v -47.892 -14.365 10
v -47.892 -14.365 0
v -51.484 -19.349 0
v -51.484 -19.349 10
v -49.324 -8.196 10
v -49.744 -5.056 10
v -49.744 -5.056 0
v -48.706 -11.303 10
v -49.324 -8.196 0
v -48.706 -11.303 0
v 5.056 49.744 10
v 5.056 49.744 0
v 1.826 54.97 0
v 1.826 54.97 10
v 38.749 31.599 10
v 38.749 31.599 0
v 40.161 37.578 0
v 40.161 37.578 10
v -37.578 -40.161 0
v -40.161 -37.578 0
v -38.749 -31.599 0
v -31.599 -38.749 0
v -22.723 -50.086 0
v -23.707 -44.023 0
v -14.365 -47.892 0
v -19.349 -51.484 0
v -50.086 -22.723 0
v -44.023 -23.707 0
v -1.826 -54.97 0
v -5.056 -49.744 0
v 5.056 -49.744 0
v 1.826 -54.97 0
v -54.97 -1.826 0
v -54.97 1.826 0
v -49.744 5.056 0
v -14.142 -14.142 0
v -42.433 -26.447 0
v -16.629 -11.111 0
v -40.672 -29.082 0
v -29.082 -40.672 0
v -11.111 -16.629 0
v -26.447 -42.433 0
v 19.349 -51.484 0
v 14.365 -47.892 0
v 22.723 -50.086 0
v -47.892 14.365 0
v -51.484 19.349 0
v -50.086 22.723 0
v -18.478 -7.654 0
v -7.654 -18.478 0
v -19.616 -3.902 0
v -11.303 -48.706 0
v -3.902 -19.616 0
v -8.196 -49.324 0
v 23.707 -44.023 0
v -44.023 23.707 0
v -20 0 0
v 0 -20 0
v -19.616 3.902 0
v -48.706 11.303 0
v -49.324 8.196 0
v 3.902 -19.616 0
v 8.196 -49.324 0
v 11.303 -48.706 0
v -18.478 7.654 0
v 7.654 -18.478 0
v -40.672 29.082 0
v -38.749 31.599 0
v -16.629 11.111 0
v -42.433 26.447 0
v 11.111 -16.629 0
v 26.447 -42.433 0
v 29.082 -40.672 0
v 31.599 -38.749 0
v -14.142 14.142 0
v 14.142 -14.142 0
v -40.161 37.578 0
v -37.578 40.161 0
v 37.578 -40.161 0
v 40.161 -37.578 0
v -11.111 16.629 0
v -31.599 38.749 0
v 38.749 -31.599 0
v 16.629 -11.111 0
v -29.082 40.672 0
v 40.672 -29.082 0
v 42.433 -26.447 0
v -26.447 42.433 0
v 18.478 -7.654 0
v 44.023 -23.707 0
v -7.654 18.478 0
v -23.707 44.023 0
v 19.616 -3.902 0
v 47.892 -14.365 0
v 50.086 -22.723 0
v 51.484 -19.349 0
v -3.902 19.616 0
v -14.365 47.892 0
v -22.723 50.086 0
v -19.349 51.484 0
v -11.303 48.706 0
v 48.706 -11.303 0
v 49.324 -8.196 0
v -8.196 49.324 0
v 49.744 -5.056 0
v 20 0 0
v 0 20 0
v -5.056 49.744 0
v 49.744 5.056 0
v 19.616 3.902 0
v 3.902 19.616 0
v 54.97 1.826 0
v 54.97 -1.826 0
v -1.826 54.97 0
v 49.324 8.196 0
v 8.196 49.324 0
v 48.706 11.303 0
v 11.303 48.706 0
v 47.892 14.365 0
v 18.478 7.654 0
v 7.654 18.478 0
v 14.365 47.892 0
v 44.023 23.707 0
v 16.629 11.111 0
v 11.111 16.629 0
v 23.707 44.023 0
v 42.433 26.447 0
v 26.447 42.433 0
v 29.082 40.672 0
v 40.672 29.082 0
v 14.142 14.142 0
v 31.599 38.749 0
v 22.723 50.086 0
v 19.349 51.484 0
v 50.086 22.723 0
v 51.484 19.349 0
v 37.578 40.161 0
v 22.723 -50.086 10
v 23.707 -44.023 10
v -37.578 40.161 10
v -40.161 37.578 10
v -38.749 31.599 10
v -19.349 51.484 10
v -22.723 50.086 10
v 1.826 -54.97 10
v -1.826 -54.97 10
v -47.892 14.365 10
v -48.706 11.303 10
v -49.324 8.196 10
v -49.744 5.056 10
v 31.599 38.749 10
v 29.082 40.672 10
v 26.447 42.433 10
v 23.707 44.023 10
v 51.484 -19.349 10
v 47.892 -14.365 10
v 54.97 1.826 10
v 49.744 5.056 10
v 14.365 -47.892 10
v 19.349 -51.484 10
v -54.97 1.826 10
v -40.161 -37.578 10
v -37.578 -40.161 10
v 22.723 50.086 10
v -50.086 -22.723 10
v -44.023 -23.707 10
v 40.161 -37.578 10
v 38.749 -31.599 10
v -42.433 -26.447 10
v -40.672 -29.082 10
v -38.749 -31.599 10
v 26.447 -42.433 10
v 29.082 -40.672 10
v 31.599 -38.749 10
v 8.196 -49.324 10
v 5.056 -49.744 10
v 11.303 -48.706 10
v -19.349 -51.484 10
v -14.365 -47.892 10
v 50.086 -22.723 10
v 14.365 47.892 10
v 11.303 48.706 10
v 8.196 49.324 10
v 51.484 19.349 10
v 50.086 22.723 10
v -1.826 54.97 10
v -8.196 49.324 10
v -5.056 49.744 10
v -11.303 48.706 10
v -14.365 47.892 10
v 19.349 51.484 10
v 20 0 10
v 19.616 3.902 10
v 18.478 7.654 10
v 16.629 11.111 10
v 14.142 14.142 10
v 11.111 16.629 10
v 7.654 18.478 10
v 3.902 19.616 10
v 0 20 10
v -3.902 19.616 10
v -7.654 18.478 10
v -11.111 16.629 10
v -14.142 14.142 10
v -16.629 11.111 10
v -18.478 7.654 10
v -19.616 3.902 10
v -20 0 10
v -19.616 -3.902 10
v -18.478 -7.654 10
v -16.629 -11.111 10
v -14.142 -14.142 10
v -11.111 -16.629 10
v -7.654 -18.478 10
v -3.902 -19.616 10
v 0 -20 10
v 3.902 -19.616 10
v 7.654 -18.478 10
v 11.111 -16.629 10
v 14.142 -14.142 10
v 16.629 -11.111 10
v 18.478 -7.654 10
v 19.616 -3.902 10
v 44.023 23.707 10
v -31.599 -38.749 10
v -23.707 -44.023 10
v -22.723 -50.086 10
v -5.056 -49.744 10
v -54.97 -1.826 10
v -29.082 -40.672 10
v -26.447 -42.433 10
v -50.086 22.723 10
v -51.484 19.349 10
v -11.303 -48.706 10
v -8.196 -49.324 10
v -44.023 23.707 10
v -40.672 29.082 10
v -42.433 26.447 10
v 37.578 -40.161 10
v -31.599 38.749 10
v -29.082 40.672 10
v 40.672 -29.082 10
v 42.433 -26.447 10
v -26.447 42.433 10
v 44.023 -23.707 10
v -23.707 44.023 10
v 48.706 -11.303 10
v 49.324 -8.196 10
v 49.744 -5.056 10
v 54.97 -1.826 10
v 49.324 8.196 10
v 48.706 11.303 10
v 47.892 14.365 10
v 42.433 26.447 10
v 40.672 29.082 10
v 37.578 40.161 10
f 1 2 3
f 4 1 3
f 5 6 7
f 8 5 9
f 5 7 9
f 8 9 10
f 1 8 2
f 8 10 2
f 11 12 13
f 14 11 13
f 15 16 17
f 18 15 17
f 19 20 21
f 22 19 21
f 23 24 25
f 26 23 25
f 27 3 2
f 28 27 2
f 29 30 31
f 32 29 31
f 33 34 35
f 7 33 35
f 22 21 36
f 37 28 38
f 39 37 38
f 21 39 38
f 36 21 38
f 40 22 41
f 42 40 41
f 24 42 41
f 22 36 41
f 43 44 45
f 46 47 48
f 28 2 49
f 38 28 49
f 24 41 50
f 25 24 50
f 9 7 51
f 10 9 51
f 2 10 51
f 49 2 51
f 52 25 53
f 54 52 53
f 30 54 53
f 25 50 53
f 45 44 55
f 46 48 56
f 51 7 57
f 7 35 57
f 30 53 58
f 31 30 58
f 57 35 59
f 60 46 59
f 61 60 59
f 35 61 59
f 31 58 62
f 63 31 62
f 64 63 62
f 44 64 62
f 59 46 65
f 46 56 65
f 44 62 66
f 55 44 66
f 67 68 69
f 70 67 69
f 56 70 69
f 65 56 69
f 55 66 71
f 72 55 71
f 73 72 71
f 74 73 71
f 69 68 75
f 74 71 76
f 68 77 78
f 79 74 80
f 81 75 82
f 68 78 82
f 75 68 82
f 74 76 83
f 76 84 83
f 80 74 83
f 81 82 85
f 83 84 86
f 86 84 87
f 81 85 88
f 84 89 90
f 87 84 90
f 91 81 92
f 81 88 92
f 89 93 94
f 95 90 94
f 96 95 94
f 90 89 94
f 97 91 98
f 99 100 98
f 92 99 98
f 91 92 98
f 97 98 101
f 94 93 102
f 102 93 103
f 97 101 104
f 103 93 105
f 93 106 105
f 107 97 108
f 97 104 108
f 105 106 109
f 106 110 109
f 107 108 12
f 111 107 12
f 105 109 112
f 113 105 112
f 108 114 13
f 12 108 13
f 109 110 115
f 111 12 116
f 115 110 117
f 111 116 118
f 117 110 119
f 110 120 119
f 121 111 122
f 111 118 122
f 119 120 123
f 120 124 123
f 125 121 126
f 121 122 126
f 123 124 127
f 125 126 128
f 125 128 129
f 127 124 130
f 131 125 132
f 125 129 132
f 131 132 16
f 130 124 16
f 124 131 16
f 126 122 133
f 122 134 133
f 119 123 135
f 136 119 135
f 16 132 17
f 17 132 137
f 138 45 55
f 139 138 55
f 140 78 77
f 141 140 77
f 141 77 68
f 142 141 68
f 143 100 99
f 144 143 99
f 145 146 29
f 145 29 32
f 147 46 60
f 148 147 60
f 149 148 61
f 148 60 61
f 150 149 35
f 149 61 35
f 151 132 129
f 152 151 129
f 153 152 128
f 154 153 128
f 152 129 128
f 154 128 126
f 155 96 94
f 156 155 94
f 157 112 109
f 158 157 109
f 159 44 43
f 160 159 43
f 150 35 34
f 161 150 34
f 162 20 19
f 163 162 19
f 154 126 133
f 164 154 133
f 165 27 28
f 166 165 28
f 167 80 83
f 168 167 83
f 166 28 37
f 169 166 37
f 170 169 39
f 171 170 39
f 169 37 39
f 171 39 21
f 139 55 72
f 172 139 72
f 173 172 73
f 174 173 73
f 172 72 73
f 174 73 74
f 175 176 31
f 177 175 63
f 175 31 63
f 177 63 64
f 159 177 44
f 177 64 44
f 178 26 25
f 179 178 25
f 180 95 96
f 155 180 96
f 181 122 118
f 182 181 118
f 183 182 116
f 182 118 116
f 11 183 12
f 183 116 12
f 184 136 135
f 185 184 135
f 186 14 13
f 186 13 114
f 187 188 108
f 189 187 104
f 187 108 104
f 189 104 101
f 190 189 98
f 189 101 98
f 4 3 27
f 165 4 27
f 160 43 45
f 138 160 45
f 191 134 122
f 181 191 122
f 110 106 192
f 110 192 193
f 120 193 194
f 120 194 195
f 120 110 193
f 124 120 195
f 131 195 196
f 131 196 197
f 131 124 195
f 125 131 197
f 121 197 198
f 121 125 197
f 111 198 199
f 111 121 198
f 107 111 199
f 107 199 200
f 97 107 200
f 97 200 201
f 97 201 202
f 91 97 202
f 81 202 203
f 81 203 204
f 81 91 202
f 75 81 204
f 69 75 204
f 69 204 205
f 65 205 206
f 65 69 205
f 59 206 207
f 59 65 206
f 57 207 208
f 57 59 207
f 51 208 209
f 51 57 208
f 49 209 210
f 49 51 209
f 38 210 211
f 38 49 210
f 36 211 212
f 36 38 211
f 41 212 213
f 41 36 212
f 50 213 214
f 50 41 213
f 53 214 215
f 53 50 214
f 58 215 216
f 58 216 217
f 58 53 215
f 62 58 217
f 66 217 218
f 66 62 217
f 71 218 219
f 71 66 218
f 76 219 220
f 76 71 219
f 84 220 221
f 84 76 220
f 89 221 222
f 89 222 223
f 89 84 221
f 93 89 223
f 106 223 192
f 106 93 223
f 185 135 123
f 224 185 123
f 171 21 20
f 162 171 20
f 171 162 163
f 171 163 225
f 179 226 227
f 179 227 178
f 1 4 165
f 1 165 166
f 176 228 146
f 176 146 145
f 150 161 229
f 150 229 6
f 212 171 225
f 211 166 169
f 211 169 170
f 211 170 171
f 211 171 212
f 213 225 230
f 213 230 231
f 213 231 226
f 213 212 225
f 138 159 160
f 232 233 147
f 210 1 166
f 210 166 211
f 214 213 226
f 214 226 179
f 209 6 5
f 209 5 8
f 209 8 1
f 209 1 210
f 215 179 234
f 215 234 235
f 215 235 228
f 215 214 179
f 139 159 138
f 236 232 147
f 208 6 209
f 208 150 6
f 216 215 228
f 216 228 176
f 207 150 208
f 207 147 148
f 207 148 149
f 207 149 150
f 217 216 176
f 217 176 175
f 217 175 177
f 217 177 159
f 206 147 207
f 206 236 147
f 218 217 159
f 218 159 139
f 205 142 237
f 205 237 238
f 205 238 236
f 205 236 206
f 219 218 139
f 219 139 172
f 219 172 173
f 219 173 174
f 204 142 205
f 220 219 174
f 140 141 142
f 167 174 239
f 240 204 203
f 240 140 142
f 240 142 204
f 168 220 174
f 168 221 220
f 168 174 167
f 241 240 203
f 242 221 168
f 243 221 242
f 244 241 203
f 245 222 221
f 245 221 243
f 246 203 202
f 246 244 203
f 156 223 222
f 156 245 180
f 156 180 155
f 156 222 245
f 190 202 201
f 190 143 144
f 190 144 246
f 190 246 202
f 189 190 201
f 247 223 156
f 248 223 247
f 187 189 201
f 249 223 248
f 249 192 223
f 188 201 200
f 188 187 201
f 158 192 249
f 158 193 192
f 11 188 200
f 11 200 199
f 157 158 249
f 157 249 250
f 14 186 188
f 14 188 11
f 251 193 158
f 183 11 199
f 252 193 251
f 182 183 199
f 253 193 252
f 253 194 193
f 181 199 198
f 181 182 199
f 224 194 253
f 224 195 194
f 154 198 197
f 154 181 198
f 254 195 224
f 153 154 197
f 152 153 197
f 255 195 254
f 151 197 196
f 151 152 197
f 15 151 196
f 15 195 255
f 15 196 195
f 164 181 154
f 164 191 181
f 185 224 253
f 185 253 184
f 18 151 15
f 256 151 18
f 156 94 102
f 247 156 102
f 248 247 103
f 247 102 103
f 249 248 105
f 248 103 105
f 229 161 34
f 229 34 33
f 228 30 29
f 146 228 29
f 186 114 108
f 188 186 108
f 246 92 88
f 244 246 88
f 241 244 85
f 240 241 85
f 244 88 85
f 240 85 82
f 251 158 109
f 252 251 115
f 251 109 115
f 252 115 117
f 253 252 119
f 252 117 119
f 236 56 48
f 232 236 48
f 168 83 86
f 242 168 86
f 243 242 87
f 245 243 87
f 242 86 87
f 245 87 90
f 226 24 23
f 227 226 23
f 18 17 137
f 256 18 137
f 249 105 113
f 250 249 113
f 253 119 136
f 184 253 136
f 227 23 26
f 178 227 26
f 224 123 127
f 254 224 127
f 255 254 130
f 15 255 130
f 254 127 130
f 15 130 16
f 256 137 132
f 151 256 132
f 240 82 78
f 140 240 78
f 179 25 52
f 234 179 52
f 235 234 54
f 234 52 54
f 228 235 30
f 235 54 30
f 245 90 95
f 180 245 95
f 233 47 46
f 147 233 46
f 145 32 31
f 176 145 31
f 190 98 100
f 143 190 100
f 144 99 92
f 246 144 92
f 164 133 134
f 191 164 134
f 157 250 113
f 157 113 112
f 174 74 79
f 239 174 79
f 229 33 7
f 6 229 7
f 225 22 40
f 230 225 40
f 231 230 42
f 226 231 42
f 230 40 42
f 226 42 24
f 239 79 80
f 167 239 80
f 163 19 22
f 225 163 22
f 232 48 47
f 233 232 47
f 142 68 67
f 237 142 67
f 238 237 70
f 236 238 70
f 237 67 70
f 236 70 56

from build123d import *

# Parameters (mm, degrees)
SKETCH1_R           = 20
BOSS_EXTRUDE1_DEPTH = 10


with BuildPart() as part:
    # Sketch1 → Boss-Extrude1 (new body)
    with BuildSketch(Plane.XY):
        with BuildLine():
            Line((1.826311743, 54.969669686), (-1.826311743, 54.969669686))
            Line((-1.826311743, 54.969669686), (-5.055544828, 49.743758066))
            ThreePointArc((-5.055544828, 49.743758066), (-9.754516101, 49.03926402), (-14.365397683, 47.891913194))
            Line((-14.365397683, 47.891913194), (-19.348689832, 51.484251979))
            Line((-19.348689832, 51.484251979), (-22.723273911, 50.086453485))
            Line((-22.723273911, 50.086453485), (-23.706826468, 44.0225667))
            ThreePointArc((-23.706826468, 44.0225667), (-27.778511651, 41.573480615), (-31.599338619, 38.74895868))
            Line((-31.599338619, 38.74895868), (-37.578028776, 40.160823613))
            Line((-37.578028776, 40.160823613), (-40.160823613, 37.578028776))
            Line((-40.160823613, 37.578028776), (-38.74895868, 31.599338619))
            ThreePointArc((-38.74895868, 31.599338619), (-41.573480615, 27.778511651), (-44.0225667, 23.706826468))
            Line((-44.0225667, 23.706826468), (-50.086453485, 22.723273911))
            Line((-50.086453485, 22.723273911), (-51.484251979, 19.348689832))
            Line((-51.484251979, 19.348689832), (-47.891913194, 14.365397683))
            ThreePointArc((-47.891913194, 14.365397683), (-49.03926402, 9.754516101), (-49.743758066, 5.055544828))
            Line((-49.743758066, 5.055544828), (-54.969669686, 1.826311743))
            Line((-54.969669686, 1.826311743), (-54.969669686, -1.826311743))
            Line((-54.969669686, -1.826311743), (-49.743758066, -5.055544828))
            ThreePointArc((-49.743758066, -5.055544828), (-49.03926402, -9.754516101), (-47.891913194, -14.365397683))
            Line((-47.891913194, -14.365397683), (-51.484251979, -19.348689832))
            Line((-51.484251979, -19.348689832), (-50.086453485, -22.723273911))
            Line((-50.086453485, -22.723273911), (-44.0225667, -23.706826468))
            ThreePointArc((-44.0225667, -23.706826468), (-41.573480615, -27.778511651), (-38.74895868, -31.599338619))
            Line((-38.74895868, -31.599338619), (-40.160823613, -37.578028776))
            Line((-40.160823613, -37.578028776), (-37.578028776, -40.160823613))
            Line((-37.578028776, -40.160823613), (-31.599338619, -38.74895868))
            ThreePointArc((-31.599338619, -38.74895868), (-27.778511651, -41.573480615), (-23.706826468, -44.0225667))
            Line((-23.706826468, -44.0225667), (-22.723273911, -50.086453485))
            Line((-22.723273911, -50.086453485), (-19.348689832, -51.484251979))
            Line((-19.348689832, -51.484251979), (-14.365397683, -47.891913194))
            ThreePointArc((-14.365397683, -47.891913194), (-9.754516101, -49.03926402), (-5.055544828, -49.743758066))
            Line((-5.055544828, -49.743758066), (-1.826311743, -54.969669686))
            Line((-1.826311743, -54.969669686), (1.826311743, -54.969669686))
            Line((1.826311743, -54.969669686), (5.055544828, -49.743758066))
            ThreePointArc((5.055544828, -49.743758066), (9.754516101, -49.03926402), (14.365397683, -47.891913194))
            Line((14.365397683, -47.891913194), (19.348689832, -51.484251979))
            Line((19.348689832, -51.484251979), (22.723273911, -50.086453485))
            Line((22.723273911, -50.086453485), (23.706826468, -44.0225667))
            ThreePointArc((23.706826468, -44.0225667), (27.778511651, -41.573480615), (31.599338619, -38.74895868))
            Line((31.599338619, -38.74895868), (37.578028776, -40.160823613))
            Line((37.578028776, -40.160823613), (40.160823613, -37.578028776))
            Line((40.160823613, -37.578028776), (38.74895868, -31.599338619))
            ThreePointArc((38.74895868, -31.599338619), (41.573480615, -27.778511651), (44.0225667, -23.706826468))
            Line((44.0225667, -23.706826468), (50.086453485, -22.723273911))
            Line((50.086453485, -22.723273911), (51.484251979, -19.348689832))
            Line((51.484251979, -19.348689832), (47.891913194, -14.365397683))
            ThreePointArc((47.891913194, -14.365397683), (49.03926402, -9.754516101), (49.743758066, -5.055544828))
            Line((49.743758066, -5.055544828), (54.969669686, -1.826311743))
            Line((54.969669686, -1.826311743), (54.969669686, 1.826311743))
            Line((54.969669686, 1.826311743), (49.743758066, 5.055544828))
            ThreePointArc((49.743758066, 5.055544828), (49.03926402, 9.754516101), (47.891913194, 14.365397683))
            Line((47.891913194, 14.365397683), (51.484251979, 19.348689832))
            Line((51.484251979, 19.348689832), (50.086453485, 22.723273911))
            Line((50.086453485, 22.723273911), (44.0225667, 23.706826468))
            ThreePointArc((44.0225667, 23.706826468), (41.573480615, 27.778511651), (38.74895868, 31.599338619))
            Line((38.74895868, 31.599338619), (40.160823613, 37.578028776))
            Line((40.160823613, 37.578028776), (37.578028776, 40.160823613))
            Line((37.578028776, 40.160823613), (31.599338619, 38.74895868))
            ThreePointArc((31.599338619, 38.74895868), (27.778511651, 41.573480615), (23.706826468, 44.0225667))
            Line((23.706826468, 44.0225667), (22.723273911, 50.086453485))
            Line((22.723273911, 50.086453485), (19.348689832, 51.484251979))
            Line((19.348689832, 51.484251979), (14.365397683, 47.891913194))
            ThreePointArc((14.365397683, 47.891913194), (9.754516101, 49.03926402), (5.055544828, 49.743758066))
            Line((5.055544828, 49.743758066), (1.826311743, 54.969669686))
        make_face()
        Circle(SKETCH1_R, mode=Mode.SUBTRACT)
    extrude(amount=BOSS_EXTRUDE1_DEPTH)


solid = part.part
